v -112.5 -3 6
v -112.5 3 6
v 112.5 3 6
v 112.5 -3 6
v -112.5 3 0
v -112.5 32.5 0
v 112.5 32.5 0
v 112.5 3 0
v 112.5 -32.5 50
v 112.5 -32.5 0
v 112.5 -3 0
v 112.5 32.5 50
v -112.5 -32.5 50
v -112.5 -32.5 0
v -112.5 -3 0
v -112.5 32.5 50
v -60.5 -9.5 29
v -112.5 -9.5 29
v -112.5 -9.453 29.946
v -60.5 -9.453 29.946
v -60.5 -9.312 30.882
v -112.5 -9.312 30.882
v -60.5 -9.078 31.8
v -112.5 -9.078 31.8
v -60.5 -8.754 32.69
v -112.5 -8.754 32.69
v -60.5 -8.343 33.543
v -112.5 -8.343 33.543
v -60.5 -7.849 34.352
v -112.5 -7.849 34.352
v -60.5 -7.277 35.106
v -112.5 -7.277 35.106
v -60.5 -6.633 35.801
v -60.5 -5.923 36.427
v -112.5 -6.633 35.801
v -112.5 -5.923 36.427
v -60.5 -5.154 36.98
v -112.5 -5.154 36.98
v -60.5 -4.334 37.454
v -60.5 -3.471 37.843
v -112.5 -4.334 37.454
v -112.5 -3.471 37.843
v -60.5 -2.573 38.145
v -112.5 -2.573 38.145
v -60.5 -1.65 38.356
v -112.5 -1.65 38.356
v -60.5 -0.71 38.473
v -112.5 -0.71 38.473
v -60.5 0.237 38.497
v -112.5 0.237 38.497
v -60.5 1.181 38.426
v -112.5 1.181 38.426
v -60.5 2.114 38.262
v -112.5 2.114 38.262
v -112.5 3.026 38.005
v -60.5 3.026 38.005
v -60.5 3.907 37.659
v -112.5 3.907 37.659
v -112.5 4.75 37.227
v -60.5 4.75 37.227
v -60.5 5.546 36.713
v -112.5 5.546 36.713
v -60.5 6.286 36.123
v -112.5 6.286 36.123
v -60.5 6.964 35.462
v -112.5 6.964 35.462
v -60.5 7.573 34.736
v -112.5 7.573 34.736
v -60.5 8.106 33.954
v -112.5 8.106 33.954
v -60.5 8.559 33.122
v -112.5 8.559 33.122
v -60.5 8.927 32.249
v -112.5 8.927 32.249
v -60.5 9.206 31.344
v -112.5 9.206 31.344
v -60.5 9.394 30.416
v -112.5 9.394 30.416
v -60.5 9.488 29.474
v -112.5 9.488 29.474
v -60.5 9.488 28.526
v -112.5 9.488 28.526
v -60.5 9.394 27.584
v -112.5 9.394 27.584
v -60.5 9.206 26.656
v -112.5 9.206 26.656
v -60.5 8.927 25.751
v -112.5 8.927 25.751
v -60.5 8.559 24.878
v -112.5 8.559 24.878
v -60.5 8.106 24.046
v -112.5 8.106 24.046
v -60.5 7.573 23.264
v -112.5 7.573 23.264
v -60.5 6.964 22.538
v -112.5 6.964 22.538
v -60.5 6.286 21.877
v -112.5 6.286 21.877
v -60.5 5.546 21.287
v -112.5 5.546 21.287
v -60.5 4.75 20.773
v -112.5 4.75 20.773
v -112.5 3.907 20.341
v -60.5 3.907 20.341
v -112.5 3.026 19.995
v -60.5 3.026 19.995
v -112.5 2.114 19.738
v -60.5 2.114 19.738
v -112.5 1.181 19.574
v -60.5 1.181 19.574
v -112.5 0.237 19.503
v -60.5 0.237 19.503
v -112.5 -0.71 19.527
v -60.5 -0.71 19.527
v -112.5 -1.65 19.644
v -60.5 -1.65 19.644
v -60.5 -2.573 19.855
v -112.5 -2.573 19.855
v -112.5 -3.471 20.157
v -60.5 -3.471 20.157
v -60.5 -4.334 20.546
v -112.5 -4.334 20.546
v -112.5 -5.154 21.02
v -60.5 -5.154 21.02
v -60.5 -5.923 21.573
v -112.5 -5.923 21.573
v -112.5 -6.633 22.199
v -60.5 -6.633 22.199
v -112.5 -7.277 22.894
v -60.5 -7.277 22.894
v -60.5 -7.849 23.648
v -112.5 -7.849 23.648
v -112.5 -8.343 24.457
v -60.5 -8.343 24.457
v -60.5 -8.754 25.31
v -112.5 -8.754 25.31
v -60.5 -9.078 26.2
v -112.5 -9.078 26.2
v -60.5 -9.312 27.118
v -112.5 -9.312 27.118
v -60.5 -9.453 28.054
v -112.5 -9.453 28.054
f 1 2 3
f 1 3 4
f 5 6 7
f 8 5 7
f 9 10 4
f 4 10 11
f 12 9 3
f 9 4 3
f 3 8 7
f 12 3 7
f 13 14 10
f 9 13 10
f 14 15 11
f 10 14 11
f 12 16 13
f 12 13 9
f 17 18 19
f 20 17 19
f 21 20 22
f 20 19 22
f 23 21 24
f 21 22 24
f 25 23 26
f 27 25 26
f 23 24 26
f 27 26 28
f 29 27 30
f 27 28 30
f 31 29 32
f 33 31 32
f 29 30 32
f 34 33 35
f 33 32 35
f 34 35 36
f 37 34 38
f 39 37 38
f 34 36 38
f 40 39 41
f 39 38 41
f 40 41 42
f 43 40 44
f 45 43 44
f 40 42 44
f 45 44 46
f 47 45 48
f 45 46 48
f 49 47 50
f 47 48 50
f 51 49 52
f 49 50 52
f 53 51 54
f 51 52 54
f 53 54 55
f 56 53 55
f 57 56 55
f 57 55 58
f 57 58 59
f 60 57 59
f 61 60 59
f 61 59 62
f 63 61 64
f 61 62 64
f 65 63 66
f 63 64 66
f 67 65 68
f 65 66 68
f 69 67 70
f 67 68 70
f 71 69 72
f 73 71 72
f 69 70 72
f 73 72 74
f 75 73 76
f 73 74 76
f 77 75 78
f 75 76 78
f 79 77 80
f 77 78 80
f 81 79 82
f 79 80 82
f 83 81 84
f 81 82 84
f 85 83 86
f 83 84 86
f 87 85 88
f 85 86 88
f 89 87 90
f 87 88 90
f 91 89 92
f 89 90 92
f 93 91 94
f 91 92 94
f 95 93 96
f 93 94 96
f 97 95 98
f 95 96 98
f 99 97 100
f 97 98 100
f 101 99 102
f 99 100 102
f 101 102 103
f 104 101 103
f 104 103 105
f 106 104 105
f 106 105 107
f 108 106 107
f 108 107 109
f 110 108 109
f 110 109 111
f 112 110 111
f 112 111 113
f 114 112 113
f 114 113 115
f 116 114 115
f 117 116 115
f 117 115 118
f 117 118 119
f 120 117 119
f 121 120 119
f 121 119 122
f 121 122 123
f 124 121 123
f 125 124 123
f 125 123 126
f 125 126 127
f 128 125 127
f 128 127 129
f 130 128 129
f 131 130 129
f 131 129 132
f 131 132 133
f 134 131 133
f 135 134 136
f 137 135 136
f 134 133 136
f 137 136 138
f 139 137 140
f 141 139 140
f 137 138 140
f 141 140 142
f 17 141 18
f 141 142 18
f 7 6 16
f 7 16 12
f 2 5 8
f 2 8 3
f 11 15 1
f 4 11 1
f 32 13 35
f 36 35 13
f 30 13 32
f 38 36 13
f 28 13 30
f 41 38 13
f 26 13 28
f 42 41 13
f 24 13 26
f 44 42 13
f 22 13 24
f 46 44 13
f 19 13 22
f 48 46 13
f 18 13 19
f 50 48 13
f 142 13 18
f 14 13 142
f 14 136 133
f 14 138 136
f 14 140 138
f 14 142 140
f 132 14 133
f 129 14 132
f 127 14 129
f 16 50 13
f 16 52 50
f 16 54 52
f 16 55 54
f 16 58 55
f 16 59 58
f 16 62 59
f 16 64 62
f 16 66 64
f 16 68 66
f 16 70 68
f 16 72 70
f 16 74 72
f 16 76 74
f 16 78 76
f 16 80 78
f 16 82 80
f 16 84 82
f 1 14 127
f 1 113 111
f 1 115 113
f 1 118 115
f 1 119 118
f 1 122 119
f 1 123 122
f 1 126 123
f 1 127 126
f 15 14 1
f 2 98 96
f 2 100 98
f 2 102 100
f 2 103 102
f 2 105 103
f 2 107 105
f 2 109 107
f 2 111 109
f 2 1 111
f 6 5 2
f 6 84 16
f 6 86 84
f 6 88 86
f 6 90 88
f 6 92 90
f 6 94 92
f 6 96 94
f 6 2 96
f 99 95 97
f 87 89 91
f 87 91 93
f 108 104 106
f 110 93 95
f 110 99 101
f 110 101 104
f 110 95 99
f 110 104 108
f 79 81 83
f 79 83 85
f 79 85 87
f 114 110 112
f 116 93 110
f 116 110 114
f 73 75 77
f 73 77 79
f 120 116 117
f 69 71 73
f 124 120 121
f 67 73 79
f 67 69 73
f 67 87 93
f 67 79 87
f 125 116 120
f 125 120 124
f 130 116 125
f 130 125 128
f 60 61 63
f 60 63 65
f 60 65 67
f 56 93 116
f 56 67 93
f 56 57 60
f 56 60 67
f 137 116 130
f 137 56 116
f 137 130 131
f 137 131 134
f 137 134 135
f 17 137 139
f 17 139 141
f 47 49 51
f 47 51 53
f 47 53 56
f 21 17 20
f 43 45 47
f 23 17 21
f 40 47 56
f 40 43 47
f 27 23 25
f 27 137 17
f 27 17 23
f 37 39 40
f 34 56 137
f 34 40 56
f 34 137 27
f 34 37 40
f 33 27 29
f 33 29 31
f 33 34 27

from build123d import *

# Parameters (mm, degrees)
F0_W     = 225
F0_H     = 65
F1_DEPTH = 50
F2_R     = 9.5
F3_DEPTH = 52
F4_W     = 6
F4_H     = 6
F5_DEPTH = 325


with BuildPart() as f1:
    # F0 (on Top) → F1 (new body)
    with BuildSketch(Plane.XY):
        Rectangle(F0_W, F0_H)
    extrude(amount=F1_DEPTH)

    # F2 (on face) → F3 (cut)
    with BuildSketch(Plane(origin=(-112.5, 0, 0), x_dir=(0, -1, 0), z_dir=(-1, 0, 0))):
        with Locations((0, 29)):
            Circle(F2_R)
    extrude(amount=-F3_DEPTH, mode=Mode.SUBTRACT)

    # F4 (on face) → F5 (cut)
    with BuildSketch(Plane(origin=(-112.5, 0, 0), x_dir=(0, -1, 0), z_dir=(-1, 0, 0))):
        with Locations((0, 3)):
            Rectangle(F4_W, F4_H)
    extrude(amount=-F5_DEPTH, mode=Mode.SUBTRACT)


solid = f1.part
